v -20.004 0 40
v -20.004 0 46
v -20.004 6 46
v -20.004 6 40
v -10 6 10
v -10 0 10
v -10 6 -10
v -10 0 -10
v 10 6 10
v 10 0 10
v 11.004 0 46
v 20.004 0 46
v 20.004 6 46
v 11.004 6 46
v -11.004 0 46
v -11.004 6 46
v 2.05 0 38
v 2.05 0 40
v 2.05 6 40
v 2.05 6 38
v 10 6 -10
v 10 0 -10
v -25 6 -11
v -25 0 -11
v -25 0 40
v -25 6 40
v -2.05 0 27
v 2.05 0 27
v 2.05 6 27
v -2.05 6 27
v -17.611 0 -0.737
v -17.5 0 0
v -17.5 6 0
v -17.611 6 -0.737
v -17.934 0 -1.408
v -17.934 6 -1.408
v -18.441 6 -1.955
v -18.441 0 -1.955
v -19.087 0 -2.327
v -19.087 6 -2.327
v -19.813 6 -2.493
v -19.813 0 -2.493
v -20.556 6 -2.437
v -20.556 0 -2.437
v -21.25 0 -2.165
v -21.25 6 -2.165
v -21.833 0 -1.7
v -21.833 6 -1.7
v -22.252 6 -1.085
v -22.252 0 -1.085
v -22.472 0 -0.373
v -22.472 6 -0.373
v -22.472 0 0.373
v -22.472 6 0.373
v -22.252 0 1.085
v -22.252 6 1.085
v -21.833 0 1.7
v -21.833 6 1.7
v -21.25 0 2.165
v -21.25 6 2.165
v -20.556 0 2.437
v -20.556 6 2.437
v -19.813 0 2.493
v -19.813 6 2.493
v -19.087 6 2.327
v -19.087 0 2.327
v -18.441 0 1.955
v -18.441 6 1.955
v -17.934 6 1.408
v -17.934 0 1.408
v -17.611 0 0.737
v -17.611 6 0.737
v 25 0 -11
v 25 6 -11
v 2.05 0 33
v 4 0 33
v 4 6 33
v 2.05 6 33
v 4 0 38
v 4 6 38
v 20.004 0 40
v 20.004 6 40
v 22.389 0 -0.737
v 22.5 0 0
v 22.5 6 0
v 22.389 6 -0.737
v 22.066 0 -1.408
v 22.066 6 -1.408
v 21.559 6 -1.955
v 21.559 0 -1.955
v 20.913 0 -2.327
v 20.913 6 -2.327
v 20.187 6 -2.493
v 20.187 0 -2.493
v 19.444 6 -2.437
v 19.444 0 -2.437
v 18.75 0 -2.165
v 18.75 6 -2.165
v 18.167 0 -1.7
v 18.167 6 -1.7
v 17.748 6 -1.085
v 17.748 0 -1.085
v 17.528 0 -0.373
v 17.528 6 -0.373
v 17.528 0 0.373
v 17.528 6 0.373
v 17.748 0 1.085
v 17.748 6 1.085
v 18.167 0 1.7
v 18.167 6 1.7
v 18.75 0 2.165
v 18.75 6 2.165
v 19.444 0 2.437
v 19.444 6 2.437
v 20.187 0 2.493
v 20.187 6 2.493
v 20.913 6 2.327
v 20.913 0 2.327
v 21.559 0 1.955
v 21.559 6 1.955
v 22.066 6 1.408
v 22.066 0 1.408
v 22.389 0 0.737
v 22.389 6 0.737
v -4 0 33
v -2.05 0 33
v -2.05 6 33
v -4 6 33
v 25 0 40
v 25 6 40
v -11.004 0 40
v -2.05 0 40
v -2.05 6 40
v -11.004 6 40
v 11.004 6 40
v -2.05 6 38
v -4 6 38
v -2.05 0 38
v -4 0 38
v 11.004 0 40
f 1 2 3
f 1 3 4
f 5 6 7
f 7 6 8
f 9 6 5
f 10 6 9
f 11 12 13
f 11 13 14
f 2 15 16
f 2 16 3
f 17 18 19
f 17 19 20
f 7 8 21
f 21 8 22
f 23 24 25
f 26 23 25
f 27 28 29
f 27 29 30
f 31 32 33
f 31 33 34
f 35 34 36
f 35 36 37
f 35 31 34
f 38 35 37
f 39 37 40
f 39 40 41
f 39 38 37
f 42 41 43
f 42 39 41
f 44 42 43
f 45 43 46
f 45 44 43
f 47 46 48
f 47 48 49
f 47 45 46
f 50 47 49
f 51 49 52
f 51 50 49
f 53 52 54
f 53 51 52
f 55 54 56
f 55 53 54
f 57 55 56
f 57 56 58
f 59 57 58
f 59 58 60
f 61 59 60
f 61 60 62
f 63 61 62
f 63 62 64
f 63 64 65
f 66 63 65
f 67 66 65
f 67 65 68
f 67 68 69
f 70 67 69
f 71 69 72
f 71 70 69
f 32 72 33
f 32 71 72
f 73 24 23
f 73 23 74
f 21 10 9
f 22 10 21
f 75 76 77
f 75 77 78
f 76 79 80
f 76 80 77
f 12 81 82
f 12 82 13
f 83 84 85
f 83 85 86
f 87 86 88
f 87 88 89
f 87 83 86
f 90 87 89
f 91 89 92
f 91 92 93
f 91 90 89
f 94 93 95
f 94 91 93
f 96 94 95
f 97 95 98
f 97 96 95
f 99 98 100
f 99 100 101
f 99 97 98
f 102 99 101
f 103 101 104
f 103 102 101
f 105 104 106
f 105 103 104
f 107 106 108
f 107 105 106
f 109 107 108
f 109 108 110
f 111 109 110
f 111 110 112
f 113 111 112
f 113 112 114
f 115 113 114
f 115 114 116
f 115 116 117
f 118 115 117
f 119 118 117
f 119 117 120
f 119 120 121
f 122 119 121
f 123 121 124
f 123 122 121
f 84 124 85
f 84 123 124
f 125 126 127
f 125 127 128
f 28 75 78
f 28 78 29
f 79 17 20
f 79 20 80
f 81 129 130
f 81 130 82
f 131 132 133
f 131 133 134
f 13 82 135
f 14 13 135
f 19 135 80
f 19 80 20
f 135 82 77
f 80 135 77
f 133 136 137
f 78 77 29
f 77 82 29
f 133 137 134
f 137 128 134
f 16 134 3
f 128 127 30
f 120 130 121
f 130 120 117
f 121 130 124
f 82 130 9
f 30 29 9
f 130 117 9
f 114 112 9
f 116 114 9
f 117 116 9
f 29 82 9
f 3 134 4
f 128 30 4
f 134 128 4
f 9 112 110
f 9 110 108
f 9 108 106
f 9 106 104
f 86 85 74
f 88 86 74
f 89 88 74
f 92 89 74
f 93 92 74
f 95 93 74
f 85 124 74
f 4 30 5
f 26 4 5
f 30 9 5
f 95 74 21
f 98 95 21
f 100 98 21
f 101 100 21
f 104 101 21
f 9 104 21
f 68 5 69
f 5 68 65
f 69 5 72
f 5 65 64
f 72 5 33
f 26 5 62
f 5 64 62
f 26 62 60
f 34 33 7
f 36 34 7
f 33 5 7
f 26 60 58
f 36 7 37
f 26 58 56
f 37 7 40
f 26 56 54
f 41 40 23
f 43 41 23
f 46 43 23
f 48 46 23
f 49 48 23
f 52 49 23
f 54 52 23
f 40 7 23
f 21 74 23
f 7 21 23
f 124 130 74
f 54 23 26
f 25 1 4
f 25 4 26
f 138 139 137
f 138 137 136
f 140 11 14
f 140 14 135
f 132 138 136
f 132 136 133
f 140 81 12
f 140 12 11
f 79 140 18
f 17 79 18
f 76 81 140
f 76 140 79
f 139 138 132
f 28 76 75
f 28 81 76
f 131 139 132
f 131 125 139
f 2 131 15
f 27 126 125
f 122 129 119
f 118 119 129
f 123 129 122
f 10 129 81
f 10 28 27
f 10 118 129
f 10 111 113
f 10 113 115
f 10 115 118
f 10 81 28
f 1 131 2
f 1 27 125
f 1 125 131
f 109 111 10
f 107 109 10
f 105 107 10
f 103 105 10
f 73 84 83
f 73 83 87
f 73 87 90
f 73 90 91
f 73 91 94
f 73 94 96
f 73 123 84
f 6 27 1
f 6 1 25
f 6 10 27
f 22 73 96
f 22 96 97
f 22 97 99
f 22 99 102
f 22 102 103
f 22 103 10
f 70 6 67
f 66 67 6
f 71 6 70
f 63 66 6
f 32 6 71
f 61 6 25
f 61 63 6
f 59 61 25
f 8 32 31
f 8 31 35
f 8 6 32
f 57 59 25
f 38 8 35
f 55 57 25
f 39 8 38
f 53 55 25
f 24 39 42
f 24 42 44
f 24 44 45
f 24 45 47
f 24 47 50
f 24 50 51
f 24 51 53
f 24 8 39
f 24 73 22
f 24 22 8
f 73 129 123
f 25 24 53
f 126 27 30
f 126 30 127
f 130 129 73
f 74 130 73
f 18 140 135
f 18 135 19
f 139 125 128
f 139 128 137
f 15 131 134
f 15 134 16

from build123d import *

# Parameters (mm, degrees)
BOSS_EXTRUDE1_DEPTH = 6
SKETCH2_R           = 2.5
SKETCH2_W           = 20
SKETCH2_H           = 20
CUT_EXTRUDE3_DEPTH  = 6


with BuildPart() as part:
    # Sketch1 → Boss-Extrude1 (new body)
    with BuildSketch(Plane(origin=(0, 0, 0), x_dir=(1, 0, 0), z_dir=(0, 1, 0))):
        Polygon((-25, 11), (25, 11), (25, -11), (25, -40), (20.004090827, -40), (20.004090827, -46), (11.004090827, -46), (11.004090827, -40), (2.05, -40), (2.05, -38), (4, -38), (4, -33), (2.05, -33), (2.05, -27), (-2.05, -27), (-2.05, -33), (-4, -33), (-4, -38), (-2.05, -38), (-2.05, -40), (-11.004090827, -40), (-11.004090827, -46), (-20.004090827, -46), (-20.004090827, -40), (-25, -40), (-25, -11), align=None)
    extrude(amount=BOSS_EXTRUDE1_DEPTH)

    # Sketch2 → Cut-Extrude3 (cut)
    with BuildSketch(Plane(origin=(0, 0, 0), x_dir=(1, 0, 0), z_dir=(0, 1, 0))):
        with Locations((-20, 0)):
            Circle(SKETCH2_R)
        with Locations((20, 0)):
            Circle(SKETCH2_R)
        Rectangle(SKETCH2_W, SKETCH2_H)
    extrude(amount=CUT_EXTRUDE3_DEPTH, mode=Mode.SUBTRACT)


solid = part.part
